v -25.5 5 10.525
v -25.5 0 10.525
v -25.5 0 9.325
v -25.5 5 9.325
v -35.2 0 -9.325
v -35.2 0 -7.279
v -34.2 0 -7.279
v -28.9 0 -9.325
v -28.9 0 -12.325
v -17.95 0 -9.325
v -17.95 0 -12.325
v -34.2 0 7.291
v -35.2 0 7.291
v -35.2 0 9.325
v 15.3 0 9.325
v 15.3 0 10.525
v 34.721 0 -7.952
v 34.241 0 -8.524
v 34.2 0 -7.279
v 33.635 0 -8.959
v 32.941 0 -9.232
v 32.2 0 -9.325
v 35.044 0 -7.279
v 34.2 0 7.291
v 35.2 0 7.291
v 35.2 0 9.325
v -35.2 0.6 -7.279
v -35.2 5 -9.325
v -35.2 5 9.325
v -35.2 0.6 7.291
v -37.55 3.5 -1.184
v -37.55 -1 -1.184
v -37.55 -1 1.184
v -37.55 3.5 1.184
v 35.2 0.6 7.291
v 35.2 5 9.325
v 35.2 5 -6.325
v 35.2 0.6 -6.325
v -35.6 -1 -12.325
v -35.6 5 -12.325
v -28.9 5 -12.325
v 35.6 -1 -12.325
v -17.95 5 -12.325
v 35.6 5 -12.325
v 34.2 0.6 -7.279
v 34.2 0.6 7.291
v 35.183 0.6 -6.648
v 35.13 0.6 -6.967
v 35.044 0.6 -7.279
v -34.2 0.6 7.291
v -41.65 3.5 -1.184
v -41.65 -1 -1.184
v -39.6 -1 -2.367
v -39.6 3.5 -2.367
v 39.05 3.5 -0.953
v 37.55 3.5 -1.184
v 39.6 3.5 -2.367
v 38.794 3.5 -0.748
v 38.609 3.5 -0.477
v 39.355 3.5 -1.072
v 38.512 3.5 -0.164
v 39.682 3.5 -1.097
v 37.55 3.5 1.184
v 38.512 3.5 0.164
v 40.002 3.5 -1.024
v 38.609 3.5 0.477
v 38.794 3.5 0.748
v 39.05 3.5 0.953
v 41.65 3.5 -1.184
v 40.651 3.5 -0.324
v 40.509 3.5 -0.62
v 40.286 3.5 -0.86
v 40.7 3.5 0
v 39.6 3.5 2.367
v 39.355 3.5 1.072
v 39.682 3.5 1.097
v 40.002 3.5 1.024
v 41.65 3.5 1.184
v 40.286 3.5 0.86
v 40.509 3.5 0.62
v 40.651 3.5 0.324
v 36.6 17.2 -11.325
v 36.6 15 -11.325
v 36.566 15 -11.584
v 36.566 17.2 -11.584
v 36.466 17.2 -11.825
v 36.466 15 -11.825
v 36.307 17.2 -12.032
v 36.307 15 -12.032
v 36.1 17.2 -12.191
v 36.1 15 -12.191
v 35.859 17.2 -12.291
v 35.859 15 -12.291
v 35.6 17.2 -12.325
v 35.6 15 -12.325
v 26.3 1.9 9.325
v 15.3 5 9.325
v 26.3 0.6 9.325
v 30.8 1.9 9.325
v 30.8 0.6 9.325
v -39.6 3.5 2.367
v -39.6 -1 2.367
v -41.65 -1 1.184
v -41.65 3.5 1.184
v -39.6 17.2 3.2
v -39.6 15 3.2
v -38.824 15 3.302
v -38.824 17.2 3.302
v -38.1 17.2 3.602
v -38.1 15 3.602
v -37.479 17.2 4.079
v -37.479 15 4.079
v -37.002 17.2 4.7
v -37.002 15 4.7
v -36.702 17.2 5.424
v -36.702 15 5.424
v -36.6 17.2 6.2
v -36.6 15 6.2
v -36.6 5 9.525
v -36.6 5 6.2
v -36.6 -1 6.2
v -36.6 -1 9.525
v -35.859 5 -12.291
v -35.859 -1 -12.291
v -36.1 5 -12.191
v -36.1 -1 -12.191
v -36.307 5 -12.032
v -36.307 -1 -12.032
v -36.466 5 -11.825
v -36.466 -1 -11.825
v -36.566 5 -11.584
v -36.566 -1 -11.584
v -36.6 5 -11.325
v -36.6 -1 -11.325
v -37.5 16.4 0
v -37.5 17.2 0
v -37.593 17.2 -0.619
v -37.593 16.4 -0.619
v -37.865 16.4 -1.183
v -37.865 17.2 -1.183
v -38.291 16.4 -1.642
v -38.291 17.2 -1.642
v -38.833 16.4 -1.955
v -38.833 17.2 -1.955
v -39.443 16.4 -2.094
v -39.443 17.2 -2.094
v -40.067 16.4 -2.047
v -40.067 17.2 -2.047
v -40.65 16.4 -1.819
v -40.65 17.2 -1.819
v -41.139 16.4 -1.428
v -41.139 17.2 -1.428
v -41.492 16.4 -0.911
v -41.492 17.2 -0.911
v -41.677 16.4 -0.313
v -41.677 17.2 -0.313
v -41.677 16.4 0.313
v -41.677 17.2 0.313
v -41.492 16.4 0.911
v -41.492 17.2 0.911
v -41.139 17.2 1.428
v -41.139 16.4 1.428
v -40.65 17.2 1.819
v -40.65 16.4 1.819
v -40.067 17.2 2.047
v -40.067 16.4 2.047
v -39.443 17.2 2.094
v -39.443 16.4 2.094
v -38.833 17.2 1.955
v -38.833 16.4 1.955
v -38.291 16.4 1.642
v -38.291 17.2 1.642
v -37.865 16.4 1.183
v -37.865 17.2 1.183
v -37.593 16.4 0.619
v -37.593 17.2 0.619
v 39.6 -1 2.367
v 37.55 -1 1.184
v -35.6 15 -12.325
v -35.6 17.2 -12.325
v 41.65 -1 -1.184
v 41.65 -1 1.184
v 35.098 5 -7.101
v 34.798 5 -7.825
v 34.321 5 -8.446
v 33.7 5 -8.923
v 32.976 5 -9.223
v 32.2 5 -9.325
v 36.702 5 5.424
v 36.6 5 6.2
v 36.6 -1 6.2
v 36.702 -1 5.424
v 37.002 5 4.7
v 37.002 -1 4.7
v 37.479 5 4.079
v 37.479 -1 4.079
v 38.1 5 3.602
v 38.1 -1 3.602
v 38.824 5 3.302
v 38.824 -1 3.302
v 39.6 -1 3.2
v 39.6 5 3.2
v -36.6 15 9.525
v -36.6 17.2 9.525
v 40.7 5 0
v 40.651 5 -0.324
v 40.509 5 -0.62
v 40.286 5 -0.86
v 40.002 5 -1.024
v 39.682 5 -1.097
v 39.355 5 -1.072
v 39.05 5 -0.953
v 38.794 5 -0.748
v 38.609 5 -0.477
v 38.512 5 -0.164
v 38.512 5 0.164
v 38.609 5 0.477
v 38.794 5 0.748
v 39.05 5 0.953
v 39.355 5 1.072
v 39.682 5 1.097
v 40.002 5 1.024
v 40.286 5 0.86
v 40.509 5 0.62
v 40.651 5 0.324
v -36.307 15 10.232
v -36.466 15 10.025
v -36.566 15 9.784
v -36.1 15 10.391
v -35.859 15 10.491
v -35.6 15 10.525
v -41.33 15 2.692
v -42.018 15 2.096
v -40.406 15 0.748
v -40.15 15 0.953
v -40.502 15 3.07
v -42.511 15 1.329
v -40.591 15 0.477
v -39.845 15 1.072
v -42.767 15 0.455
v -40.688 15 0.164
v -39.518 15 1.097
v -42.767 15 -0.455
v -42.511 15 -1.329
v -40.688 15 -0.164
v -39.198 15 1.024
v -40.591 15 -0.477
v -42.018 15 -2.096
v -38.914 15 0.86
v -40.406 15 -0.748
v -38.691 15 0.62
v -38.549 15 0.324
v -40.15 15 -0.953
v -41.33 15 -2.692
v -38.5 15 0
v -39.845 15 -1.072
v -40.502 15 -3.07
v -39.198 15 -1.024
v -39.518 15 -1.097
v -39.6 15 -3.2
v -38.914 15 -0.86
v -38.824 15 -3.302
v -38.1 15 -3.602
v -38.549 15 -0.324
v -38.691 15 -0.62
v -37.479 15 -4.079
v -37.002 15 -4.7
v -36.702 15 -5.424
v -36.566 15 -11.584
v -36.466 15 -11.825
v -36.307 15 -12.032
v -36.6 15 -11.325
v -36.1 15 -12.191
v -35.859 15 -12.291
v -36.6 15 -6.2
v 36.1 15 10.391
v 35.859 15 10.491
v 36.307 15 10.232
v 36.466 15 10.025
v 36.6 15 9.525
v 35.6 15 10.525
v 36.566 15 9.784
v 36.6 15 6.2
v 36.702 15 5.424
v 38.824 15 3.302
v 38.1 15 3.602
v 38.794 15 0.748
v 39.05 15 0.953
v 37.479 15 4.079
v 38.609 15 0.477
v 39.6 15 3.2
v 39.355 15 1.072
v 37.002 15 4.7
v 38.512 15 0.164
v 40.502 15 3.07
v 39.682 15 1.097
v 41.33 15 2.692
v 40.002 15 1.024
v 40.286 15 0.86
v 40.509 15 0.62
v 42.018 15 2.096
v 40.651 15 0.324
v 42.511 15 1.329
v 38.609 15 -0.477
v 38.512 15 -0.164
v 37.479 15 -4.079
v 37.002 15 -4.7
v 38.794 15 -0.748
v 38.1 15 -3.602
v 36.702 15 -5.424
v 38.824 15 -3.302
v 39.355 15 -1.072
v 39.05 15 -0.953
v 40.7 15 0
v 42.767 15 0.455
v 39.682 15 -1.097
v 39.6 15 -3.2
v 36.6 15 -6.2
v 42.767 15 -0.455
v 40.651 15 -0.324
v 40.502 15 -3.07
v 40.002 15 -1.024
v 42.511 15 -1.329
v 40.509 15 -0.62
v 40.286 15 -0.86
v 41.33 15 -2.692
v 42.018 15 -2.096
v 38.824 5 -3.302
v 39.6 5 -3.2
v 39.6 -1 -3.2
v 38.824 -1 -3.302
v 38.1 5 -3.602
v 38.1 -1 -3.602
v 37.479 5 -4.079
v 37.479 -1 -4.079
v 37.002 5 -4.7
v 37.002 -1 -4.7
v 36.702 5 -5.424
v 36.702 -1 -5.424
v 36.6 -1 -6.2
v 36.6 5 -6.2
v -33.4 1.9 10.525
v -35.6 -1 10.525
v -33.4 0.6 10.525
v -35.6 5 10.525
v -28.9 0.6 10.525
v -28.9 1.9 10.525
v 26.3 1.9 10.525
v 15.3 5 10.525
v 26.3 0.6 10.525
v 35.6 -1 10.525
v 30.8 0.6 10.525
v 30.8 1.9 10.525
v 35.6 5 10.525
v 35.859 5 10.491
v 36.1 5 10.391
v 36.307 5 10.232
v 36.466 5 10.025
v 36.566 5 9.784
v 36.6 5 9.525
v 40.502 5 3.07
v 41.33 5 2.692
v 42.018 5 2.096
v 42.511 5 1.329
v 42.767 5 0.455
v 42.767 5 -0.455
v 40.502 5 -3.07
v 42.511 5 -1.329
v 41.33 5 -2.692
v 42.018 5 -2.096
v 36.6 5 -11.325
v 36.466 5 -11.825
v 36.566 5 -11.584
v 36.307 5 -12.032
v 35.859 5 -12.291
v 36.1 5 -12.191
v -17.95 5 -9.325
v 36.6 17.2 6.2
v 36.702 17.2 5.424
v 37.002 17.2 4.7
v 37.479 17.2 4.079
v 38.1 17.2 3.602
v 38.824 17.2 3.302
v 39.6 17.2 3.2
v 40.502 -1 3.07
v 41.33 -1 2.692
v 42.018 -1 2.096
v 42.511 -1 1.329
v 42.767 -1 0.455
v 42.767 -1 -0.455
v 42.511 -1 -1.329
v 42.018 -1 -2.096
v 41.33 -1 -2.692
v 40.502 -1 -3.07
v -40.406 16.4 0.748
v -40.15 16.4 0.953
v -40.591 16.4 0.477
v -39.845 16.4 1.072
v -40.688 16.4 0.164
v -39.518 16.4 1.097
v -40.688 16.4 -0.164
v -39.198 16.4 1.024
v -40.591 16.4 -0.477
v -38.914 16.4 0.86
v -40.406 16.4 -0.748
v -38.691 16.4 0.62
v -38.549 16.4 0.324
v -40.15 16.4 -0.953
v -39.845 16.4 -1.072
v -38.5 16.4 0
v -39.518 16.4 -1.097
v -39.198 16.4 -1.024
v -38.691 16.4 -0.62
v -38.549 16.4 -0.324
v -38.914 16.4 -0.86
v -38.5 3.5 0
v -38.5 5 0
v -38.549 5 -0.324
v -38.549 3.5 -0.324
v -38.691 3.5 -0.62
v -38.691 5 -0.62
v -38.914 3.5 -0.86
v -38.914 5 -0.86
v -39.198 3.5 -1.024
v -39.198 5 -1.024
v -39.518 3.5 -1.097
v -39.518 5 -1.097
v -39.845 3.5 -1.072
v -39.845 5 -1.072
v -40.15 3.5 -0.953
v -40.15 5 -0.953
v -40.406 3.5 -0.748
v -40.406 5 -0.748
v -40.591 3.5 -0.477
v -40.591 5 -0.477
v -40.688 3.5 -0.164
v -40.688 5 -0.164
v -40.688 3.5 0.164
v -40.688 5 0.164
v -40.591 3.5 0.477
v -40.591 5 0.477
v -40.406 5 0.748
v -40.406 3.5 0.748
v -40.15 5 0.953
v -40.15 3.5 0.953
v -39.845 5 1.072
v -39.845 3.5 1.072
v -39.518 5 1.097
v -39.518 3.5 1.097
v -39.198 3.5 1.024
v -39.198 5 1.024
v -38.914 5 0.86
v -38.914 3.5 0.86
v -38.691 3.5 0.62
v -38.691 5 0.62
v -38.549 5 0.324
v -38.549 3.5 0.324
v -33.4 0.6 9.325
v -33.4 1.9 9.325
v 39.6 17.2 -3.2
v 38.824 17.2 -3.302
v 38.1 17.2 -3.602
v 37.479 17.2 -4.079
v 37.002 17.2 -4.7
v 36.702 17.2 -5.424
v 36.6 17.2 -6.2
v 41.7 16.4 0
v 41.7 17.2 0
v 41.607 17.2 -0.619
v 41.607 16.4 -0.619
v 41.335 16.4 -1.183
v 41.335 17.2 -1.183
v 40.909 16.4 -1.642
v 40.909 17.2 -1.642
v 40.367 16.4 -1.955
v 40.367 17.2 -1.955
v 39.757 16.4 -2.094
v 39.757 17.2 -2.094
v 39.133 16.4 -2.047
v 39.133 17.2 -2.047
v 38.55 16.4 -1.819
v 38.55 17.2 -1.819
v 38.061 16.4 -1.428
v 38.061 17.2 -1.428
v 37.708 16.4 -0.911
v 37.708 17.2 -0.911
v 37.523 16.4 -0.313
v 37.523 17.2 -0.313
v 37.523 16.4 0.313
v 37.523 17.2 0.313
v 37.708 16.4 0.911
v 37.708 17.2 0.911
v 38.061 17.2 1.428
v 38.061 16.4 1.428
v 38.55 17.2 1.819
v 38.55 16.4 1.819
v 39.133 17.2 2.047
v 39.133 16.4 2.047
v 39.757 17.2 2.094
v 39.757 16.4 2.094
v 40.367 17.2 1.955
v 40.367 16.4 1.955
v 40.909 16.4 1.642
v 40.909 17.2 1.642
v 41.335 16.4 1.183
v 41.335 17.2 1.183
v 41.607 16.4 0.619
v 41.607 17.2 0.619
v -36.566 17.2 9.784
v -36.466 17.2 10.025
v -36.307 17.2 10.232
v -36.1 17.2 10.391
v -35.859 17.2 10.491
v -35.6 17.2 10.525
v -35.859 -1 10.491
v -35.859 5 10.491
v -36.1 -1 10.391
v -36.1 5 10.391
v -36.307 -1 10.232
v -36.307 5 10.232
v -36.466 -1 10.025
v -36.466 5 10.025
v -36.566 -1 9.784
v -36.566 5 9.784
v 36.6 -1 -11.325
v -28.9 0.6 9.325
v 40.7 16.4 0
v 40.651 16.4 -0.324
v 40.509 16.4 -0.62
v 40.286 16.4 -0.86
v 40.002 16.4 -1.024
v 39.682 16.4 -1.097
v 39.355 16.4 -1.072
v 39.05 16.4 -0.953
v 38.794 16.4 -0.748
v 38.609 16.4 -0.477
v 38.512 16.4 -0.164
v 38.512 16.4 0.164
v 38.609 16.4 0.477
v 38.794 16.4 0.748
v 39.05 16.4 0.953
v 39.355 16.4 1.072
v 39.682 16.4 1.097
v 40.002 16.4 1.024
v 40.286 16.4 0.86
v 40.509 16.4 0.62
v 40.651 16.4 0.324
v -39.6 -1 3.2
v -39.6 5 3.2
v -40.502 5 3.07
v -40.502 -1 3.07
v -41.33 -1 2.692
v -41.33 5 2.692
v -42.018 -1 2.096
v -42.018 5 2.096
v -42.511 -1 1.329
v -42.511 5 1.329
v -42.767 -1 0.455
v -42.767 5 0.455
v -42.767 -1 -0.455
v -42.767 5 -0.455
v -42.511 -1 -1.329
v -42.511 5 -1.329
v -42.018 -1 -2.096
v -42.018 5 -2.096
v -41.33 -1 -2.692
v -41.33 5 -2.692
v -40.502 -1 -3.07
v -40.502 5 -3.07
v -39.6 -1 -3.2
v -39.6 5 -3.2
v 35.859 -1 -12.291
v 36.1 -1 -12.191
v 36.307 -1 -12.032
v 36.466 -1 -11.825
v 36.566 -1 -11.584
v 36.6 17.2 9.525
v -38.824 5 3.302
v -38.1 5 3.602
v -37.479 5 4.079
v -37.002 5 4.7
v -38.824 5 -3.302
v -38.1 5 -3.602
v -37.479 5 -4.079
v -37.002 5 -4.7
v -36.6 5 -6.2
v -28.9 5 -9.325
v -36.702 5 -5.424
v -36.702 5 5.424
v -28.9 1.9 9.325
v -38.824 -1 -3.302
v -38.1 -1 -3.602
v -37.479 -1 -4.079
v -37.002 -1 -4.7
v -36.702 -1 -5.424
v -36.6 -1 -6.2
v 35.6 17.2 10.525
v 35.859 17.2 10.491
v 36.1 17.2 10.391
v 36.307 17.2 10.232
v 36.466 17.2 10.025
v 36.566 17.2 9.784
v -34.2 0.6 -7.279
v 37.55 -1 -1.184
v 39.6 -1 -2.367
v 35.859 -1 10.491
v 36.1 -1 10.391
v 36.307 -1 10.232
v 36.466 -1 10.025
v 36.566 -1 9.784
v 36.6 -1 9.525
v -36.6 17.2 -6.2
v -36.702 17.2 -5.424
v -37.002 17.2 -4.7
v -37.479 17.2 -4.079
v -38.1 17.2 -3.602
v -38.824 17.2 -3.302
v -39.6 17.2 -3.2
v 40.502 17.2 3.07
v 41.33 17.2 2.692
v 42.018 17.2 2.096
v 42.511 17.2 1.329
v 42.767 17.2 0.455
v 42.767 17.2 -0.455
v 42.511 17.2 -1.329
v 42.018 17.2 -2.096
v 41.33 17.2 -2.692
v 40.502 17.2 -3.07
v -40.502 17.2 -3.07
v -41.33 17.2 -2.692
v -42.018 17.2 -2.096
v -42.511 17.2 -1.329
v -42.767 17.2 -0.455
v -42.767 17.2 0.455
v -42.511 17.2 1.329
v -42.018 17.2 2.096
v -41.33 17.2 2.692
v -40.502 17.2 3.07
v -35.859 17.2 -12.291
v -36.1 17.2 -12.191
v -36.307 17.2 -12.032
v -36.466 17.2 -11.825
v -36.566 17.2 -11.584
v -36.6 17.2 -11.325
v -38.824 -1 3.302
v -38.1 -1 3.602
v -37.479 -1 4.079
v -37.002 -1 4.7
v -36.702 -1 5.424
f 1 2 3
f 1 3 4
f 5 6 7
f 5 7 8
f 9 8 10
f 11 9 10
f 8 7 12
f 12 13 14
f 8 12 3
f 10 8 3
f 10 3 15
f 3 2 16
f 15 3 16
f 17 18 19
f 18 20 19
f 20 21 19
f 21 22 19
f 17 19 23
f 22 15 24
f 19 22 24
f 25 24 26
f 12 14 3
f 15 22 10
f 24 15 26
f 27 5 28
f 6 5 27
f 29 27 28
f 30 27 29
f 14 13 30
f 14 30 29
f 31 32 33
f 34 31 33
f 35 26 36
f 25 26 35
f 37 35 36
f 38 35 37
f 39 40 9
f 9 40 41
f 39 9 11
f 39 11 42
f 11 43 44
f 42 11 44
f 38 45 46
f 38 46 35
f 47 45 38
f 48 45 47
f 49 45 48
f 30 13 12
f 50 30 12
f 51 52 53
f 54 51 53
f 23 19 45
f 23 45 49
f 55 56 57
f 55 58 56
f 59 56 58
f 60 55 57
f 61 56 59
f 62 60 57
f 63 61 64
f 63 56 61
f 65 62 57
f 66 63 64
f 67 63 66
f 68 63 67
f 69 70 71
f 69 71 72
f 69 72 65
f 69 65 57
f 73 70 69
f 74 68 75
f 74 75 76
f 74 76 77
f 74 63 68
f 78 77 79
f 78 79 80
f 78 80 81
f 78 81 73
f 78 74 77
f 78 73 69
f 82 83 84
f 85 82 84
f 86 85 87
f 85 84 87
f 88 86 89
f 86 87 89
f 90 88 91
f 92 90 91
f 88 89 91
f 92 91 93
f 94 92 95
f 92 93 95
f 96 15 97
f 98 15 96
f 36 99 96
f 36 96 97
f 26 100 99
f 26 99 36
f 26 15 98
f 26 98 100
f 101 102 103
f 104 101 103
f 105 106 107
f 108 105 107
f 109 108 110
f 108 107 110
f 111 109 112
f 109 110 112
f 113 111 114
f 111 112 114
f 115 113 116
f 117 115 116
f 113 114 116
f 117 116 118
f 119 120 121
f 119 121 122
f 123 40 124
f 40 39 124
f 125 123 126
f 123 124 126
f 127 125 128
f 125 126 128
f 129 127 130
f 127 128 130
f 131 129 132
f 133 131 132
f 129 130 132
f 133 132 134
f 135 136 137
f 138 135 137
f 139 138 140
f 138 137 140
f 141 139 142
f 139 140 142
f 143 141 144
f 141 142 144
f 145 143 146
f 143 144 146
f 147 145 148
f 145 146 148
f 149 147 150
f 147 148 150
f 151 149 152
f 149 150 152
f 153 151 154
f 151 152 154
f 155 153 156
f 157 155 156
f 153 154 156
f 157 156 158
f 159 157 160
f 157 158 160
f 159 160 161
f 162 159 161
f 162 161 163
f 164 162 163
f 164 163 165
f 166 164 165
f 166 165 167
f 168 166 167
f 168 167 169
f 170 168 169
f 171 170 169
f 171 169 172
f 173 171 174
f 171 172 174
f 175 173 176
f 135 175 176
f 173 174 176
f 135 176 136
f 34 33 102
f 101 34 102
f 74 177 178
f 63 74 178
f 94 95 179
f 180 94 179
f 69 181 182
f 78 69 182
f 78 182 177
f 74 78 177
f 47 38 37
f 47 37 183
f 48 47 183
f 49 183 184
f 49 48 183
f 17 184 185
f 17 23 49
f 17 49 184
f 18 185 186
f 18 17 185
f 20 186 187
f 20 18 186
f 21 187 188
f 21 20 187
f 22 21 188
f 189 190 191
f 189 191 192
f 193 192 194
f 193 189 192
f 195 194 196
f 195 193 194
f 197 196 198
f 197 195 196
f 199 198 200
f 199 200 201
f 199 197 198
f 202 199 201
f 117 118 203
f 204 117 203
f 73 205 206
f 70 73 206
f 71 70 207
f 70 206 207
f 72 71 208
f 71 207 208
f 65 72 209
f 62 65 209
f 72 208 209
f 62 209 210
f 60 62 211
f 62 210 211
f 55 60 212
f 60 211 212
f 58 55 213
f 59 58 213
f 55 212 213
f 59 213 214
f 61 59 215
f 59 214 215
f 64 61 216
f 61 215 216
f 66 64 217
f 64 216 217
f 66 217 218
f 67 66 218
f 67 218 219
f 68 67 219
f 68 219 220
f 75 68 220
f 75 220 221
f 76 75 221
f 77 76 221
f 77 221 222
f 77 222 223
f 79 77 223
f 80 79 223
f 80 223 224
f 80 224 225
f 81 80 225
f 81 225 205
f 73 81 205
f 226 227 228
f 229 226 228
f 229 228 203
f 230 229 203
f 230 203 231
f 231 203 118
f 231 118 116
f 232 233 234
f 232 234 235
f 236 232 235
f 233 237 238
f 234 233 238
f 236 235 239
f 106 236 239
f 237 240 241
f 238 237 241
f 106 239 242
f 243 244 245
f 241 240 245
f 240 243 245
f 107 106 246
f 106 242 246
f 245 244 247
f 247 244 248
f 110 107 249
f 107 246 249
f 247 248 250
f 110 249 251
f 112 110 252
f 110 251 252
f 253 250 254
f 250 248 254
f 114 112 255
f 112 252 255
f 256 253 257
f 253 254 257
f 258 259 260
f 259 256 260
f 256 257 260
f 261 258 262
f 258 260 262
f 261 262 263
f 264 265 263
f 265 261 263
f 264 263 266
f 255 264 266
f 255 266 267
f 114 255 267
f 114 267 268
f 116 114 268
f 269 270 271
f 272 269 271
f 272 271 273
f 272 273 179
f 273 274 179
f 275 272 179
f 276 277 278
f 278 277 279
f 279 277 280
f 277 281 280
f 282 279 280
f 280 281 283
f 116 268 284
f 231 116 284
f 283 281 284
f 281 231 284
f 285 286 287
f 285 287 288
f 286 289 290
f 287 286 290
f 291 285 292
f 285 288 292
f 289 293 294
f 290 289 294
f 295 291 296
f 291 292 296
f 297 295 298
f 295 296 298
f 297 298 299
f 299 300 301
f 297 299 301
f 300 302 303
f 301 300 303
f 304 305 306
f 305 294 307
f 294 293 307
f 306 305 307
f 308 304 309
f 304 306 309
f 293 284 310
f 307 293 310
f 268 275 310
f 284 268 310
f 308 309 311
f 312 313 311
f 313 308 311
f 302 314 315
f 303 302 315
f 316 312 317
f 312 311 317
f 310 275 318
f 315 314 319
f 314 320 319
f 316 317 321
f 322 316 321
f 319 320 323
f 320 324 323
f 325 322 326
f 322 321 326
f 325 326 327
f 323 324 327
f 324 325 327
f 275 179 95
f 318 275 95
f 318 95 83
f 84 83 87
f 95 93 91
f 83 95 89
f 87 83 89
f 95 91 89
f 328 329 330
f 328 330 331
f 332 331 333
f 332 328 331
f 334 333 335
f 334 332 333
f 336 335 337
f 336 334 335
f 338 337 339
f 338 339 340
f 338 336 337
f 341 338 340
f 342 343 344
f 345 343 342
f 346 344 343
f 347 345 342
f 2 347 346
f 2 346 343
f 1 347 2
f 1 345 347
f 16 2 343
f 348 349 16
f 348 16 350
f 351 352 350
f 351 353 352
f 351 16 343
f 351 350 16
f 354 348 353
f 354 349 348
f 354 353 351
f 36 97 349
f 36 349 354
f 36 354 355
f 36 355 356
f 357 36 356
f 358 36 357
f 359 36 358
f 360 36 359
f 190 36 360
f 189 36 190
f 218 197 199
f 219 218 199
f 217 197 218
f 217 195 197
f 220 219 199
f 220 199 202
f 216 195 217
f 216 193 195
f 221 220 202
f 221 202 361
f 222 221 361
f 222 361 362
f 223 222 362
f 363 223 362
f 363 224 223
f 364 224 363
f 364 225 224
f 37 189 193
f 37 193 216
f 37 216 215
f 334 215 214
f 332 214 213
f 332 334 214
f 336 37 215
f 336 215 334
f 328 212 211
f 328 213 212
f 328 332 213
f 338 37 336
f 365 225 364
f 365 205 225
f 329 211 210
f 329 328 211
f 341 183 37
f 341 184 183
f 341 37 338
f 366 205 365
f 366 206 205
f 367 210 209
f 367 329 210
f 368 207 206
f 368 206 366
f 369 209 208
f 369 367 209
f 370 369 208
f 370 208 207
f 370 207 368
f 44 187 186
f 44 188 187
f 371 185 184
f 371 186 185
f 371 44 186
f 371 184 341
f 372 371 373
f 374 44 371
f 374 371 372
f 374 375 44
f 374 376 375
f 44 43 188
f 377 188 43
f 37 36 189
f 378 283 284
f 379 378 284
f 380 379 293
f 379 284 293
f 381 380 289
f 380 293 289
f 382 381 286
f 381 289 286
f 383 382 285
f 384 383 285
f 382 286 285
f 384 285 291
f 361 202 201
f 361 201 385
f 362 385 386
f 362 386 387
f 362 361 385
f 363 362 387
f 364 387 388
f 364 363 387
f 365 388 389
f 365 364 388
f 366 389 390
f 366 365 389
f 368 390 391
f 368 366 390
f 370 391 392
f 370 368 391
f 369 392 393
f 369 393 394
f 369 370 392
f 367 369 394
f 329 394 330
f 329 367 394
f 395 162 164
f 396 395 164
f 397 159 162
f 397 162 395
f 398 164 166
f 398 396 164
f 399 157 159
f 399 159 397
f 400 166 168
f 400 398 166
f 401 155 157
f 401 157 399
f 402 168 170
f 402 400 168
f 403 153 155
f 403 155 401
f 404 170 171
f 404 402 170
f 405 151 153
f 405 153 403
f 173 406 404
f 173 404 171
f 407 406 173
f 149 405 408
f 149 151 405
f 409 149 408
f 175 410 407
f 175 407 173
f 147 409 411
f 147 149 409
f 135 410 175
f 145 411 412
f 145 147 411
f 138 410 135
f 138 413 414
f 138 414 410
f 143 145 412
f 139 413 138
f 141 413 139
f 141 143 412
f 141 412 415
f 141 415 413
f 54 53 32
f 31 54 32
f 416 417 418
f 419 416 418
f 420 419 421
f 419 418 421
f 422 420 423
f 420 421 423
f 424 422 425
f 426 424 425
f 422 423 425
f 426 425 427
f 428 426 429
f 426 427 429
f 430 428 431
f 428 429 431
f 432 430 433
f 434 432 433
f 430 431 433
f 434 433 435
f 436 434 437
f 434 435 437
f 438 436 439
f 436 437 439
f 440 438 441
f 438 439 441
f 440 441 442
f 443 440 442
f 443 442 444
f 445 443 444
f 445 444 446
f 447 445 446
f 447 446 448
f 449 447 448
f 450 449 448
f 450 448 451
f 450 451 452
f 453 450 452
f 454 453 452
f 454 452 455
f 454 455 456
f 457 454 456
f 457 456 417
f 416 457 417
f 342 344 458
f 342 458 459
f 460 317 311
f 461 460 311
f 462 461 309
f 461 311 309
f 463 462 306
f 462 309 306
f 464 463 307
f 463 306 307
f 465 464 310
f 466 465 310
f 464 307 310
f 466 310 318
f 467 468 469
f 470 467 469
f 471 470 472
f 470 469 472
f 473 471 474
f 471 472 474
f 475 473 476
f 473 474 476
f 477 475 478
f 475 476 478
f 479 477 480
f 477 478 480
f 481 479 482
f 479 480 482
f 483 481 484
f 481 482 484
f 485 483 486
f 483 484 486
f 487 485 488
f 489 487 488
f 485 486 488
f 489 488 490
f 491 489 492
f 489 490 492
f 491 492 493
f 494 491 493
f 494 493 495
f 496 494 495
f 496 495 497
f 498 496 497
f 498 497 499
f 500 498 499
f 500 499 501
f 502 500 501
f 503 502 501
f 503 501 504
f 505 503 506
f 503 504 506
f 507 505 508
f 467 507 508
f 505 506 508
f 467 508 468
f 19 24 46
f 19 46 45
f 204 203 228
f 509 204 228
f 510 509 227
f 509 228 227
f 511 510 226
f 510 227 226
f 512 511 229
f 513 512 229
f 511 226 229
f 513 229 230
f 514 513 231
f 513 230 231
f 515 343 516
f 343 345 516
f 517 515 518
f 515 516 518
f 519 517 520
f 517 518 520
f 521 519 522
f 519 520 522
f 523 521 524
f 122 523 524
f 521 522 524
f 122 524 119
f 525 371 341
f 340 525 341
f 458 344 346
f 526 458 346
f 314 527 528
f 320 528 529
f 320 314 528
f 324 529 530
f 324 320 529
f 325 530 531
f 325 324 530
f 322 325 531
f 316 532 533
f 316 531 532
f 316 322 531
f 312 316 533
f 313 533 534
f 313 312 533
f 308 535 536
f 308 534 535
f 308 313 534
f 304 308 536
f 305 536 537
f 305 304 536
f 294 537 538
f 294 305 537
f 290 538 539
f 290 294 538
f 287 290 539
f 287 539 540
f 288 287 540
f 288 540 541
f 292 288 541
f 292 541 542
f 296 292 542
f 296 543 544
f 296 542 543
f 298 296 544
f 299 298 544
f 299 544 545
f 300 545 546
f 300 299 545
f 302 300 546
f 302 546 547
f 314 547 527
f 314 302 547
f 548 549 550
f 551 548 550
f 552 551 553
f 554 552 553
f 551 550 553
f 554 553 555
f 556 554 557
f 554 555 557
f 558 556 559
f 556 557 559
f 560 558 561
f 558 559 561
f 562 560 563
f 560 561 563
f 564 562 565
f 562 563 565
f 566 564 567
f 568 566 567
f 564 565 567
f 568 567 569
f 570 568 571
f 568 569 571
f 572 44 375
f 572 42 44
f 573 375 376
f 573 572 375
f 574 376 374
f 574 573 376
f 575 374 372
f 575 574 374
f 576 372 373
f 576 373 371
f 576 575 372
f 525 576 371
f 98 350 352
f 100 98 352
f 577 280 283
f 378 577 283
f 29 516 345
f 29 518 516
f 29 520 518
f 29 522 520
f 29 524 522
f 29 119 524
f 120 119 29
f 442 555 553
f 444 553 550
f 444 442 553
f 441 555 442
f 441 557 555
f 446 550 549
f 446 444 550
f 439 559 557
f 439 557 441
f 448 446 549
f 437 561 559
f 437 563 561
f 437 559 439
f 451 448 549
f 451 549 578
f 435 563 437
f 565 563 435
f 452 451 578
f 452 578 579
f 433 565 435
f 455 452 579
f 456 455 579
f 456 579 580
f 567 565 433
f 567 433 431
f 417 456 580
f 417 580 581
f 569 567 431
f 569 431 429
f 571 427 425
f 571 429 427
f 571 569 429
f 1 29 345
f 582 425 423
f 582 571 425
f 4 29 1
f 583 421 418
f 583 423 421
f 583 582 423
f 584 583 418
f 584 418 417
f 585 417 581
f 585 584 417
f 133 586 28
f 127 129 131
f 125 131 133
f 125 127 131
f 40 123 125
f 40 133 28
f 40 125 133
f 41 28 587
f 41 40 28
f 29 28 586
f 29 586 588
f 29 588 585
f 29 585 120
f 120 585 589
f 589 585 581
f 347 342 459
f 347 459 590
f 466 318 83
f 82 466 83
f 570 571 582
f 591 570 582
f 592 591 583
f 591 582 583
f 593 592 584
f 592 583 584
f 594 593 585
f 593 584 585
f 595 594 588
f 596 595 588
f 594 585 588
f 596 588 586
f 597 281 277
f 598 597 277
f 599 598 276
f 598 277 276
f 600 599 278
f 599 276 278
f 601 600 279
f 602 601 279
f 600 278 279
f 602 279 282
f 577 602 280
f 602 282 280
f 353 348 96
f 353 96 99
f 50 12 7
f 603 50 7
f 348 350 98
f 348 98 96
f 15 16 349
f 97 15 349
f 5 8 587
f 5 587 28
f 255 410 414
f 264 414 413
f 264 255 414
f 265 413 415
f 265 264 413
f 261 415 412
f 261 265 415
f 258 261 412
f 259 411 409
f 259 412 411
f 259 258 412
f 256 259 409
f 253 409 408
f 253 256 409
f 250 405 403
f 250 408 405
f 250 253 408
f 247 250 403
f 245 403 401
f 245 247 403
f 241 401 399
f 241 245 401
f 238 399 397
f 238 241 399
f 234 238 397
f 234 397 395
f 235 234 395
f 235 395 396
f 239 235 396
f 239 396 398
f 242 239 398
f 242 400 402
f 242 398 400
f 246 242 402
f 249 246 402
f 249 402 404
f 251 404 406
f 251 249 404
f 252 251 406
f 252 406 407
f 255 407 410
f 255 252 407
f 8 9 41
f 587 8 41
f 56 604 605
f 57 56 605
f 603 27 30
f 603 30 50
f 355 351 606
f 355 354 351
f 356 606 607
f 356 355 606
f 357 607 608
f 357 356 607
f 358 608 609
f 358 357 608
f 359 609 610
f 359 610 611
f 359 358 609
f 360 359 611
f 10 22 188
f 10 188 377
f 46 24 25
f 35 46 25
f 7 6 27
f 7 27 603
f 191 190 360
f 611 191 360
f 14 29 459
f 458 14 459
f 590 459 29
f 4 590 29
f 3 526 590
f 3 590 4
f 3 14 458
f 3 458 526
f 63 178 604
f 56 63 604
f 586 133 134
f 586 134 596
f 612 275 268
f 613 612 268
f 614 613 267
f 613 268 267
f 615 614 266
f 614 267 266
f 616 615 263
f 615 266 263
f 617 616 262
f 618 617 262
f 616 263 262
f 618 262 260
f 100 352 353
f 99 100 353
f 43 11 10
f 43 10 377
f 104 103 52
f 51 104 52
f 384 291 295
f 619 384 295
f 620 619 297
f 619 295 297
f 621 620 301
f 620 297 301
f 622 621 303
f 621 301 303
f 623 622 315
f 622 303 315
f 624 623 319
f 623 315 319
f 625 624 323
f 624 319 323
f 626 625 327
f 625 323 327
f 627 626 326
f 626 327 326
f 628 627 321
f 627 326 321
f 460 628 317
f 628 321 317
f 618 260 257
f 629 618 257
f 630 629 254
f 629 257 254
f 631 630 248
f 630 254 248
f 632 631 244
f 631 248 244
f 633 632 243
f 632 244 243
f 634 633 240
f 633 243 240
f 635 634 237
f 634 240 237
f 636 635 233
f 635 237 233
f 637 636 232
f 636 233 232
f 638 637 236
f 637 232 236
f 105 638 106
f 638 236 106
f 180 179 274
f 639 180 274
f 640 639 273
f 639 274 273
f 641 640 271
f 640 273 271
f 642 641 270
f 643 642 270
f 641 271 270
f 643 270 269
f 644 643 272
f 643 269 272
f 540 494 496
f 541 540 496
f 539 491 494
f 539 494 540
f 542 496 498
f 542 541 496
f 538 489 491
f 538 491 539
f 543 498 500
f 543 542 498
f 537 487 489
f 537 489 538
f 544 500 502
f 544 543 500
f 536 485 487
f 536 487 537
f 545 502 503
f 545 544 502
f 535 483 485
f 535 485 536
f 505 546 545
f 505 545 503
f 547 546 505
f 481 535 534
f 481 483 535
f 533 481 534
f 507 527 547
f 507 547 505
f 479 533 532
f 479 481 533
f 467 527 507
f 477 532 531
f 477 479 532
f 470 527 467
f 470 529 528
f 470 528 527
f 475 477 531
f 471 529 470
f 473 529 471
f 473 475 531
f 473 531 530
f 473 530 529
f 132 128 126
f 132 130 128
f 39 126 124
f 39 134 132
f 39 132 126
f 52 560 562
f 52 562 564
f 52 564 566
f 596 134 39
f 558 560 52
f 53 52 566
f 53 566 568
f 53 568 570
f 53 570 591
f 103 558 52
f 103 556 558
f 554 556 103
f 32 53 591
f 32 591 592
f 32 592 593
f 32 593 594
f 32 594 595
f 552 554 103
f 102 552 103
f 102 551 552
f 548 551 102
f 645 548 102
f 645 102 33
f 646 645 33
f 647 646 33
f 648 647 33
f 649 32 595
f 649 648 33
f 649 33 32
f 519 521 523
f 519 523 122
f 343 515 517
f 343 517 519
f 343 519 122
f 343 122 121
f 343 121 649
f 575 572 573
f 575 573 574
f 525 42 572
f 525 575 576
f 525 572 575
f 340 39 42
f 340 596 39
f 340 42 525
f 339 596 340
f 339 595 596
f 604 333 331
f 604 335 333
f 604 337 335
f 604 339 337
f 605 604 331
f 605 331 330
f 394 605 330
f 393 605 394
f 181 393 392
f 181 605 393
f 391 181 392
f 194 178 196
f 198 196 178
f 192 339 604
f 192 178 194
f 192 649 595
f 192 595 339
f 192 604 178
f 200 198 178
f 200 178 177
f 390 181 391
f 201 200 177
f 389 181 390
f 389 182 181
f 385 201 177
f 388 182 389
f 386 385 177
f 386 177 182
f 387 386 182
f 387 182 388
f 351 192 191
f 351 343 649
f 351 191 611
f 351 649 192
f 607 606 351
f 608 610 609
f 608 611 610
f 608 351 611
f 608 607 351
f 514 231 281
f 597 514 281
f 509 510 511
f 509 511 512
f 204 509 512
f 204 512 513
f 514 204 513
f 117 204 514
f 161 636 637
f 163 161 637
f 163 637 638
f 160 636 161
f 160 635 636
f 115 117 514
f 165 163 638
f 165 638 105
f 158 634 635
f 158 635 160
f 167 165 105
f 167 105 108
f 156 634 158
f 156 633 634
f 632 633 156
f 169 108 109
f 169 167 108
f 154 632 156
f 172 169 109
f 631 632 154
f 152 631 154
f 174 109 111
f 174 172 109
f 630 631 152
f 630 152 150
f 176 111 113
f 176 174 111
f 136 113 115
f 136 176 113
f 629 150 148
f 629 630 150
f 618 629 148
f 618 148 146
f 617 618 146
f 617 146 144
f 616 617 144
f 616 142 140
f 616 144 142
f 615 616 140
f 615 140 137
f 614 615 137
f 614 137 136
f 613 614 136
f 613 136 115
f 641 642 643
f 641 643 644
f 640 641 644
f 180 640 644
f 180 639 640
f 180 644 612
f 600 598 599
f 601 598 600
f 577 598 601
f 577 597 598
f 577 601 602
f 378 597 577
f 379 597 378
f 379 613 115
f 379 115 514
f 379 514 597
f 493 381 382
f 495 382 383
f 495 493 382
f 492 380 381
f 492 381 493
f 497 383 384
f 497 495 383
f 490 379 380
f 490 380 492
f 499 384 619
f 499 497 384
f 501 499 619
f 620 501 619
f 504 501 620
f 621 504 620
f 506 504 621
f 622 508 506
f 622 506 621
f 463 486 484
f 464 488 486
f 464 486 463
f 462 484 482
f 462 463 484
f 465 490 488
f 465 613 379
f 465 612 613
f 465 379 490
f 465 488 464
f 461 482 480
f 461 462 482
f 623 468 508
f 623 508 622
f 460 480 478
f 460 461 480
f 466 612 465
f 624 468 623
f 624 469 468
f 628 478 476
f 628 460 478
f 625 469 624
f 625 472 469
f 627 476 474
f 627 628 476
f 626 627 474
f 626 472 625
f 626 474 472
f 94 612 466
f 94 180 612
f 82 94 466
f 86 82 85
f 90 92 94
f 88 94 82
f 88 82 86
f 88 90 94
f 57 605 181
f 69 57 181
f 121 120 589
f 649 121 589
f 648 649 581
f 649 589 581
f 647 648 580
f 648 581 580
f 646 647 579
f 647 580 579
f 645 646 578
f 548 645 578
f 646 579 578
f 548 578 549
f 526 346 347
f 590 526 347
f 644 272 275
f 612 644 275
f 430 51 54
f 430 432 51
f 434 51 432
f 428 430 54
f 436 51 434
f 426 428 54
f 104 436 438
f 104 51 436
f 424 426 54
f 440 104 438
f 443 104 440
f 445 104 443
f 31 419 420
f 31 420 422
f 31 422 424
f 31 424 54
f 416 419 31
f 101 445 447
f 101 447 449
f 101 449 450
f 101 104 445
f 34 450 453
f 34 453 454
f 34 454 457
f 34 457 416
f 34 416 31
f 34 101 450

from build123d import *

# Parameters (mm, degrees)
SKETCH_1_W          = 73.2
SKETCH_1_H          = 22.85
EXTRUDE_1_DEPTH     = 5
SKETCH_2_W          = 73.2
SKETCH_2_H          = 22.85
EXTRUDE_2_DEPTH     = 1
SKETCH_3_W          = 1
SKETCH_3_H          = 14.570353531
EXTRUDE_3_DEPTH     = 0.6
CUT_EXTRUDE_1_REACH = 24.85
SKETCH_4_W          = 10.95
SKETCH_4_H          = 5
CUT_EXTRUDE_2_REACH = 24.85
SKETCH_5_W          = 40.8
SKETCH_5_H          = 5
SKETCH_5_W_2        = 4.5
SKETCH_5_H_2        = 1.3
FILLET_1_R          = 1
SKETCH_6_R          = 1.1
EXTRUDE_4_DEPTH     = 6
CUT_EXTRUDE_3_DEPTH = 4.5
SKETCH_8_R          = 1.1
EXTRUDE_5_DEPTH     = 2.2
SKETCH_9_R          = 2.1
CUT_EXTRUDE_4_DEPTH = 0.8


with BuildPart() as part:
    # 草图1 → 凸台-拉伸1 (new body)
    with BuildSketch(Plane(origin=(0, 0, 0), x_dir=(1, 0, 0), z_dir=(0, 1, 0))):
        with Locations((0, 0.9)):
            Rectangle(SKETCH_1_W, SKETCH_1_H)
        with BuildLine():
            Line((-35.2, -9.325), (35.2, -9.325))
            Line((35.2, -9.325), (35.2, 6.325))
            ThreePointArc((35.2, 6.325), (34.321320344, 8.446320344), (32.2, 9.325))
            Line((32.2, 9.325), (-35.2, 9.325))
            Line((-35.2, 9.325), (-35.2, -9.325))
        make_face(mode=Mode.SUBTRACT)
    extrude(amount=EXTRUDE_1_DEPTH)

    # 草图2 → 凸台-拉伸2 (add)
    with BuildSketch(Plane.XZ):
        with Locations((0, -0.9)):
            Rectangle(SKETCH_2_W, SKETCH_2_H)
    extrude(amount=EXTRUDE_2_DEPTH)

    # 草图3 → 凸台-拉伸3 (add)
    with BuildSketch(Plane(origin=(0, 0, 0), x_dir=(1, 0, 0), z_dir=(0, 1, 0))):
        with Locations((-34.7, -0.005928717)):
            Rectangle(SKETCH_3_W, SKETCH_3_H)
        with Locations((34.7, -0.005928717)):
            Rectangle(SKETCH_3_W, SKETCH_3_H)
    extrude(amount=EXTRUDE_3_DEPTH)

    # 草图4 → 切除-拉伸1 (cut, up to next)
    with BuildSketch(Plane(origin=(0, 0, -12.325), x_dir=(-1, 0, 0), z_dir=(0, 0, -1)), mode=Mode.PRIVATE) as cut_extrude_1_sk1:
        with Locations((23.425, 2.5)):
            Rectangle(SKETCH_4_W, SKETCH_4_H)
    cut_extrude_1_tool1 = extrude(cut_extrude_1_sk1.sketch, amount=-CUT_EXTRUDE_1_REACH, mode=Mode.PRIVATE) & part.part
    add(cut_extrude_1_tool1.solids().sort_by_distance((-23.425, 2.5, -12.325))[0], mode=Mode.SUBTRACT)

    # 草图5 → 切除-拉伸2 (cut, up to next)
    with BuildSketch(Plane.XY.offset(10.525), mode=Mode.PRIVATE) as cut_extrude_2_sk1:
        with Locations((-5.1, 2.5)):
            Rectangle(SKETCH_5_W, SKETCH_5_H)
    cut_extrude_2_tool1 = extrude(cut_extrude_2_sk1.sketch, amount=-CUT_EXTRUDE_2_REACH, mode=Mode.PRIVATE) & part.part
    add(cut_extrude_2_tool1.solids().sort_by_distance((-5.1, 2.5, 10.525))[0], mode=Mode.SUBTRACT)
    # 草图5 → 切除-拉伸2 (cut, up to next)
    with BuildSketch(Plane.XY.offset(10.525), mode=Mode.PRIVATE) as cut_extrude_2_sk2:
        with Locations((-31.15, 1.25)):
            Rectangle(SKETCH_5_W_2, SKETCH_5_H_2)
    cut_extrude_2_tool2 = extrude(cut_extrude_2_sk2.sketch, amount=-CUT_EXTRUDE_2_REACH, mode=Mode.PRIVATE) & part.part
    add(cut_extrude_2_tool2.solids().sort_by_distance((-31.15, 1.25, 10.525))[0], mode=Mode.SUBTRACT)
    # 草图5 → 切除-拉伸2 (cut, up to next)
    with BuildSketch(Plane.XY.offset(10.525), mode=Mode.PRIVATE) as cut_extrude_2_sk3:
        with Locations((28.55, 1.25)):
            Rectangle(SKETCH_5_W_2, SKETCH_5_H_2)
    cut_extrude_2_tool3 = extrude(cut_extrude_2_sk3.sketch, amount=-CUT_EXTRUDE_2_REACH, mode=Mode.PRIVATE) & part.part
    add(cut_extrude_2_tool3.solids().sort_by_distance((28.55, 1.25, 10.525))[0], mode=Mode.SUBTRACT)

    # 圆角1
    fillet_1_edges = [part.edges().sort_by_distance(p)[0] for p in [
        (-36.6, 2, -12.325),
        (36.6, 2, -12.325),
        (36.6, 2, 10.525),
        (-36.6, 2, 10.525),
    ]]
    fillet(fillet_1_edges, radius=FILLET_1_R)

    # 草图6 → 凸台-拉伸4 (add)
    with BuildSketch(Plane(origin=(0, 5, 0), x_dir=(1, 0, 0), z_dir=(0, 1, 0))):
        with BuildLine():
            Line((-36.6, 6.2), (-36.6, -6.2))
            ThreePointArc((-36.6, -6.2), (-37.478679656, -4.078679656), (-39.6, -3.2))
            ThreePointArc((-39.6, -3.2), (-42.8, 0), (-39.6, 3.2))
            ThreePointArc((-39.6, 3.2), (-37.478679656, 4.078679656), (-36.6, 6.2))
        make_face()
        with Locations((-39.6, 0)):
            Circle(SKETCH_6_R, mode=Mode.SUBTRACT)
        with BuildLine():
            Line((36.6, 6.2), (36.6, -6.2))
            ThreePointArc((36.6, -6.2), (37.478679656, -4.078679656), (39.6, -3.2))
            ThreePointArc((39.6, -3.2), (42.8, 0), (39.6, 3.2))
            ThreePointArc((39.6, 3.2), (37.478679656, 4.078679656), (36.6, 6.2))
        make_face()
        with Locations((39.6, 0)):
            Circle(SKETCH_6_R, mode=Mode.SUBTRACT)
    extrude(amount=-EXTRUDE_4_DEPTH)

    # 草图7 → 切除-拉伸3 (cut)
    with BuildSketch(Plane.XZ.offset(1)):
        Polygon((-37.55, 1.183568052), (-39.6, 2.367136104), (-41.65, 1.183568052), (-41.65, -1.183568052), (-39.6, -2.367136104), (-37.55, -1.183568052), align=None)
        Polygon((39.6, 2.367136104), (37.55, 1.183568052), (37.55, -1.183568052), (39.6, -2.367136104), (41.65, -1.183568052), (41.65, 1.183568052), align=None)
    extrude(amount=-CUT_EXTRUDE_3_DEPTH, mode=Mode.SUBTRACT)


with BuildPart() as body_2:
    # 草图8 → 凸台-拉伸5 (new body)
    with BuildSketch(Plane(origin=(0, 15, 0), x_dir=(1, 0, 0), z_dir=(0, 1, 0))):
        with BuildLine():
            Line((36.6, -9.525), (36.6, -6.2))
            ThreePointArc((36.6, -6.2), (37.478679656, -4.078679656), (39.6, -3.2))
            ThreePointArc((39.6, -3.2), (42.8, 0), (39.6, 3.2))
            ThreePointArc((39.6, 3.2), (37.478679656, 4.078679656), (36.6, 6.2))
            Line((36.6, 6.2), (36.6, 11.325))
            ThreePointArc((36.6, 11.325), (36.307106781, 12.032106781), (35.6, 12.325))
            Line((35.6, 12.325), (-35.6, 12.325))
            ThreePointArc((-35.6, 12.325), (-36.307106781, 12.032106781), (-36.6, 11.325))
            Line((-36.6, 11.325), (-36.6, 6.2))
            ThreePointArc((-36.6, 6.2), (-37.478679656, 4.078679656), (-39.6, 3.2))
            ThreePointArc((-39.6, 3.2), (-42.8, 0), (-39.6, -3.2))
            ThreePointArc((-39.6, -3.2), (-37.478679656, -4.078679656), (-36.6, -6.2))
            Line((-36.6, -6.2), (-36.6, -9.525))
            ThreePointArc((-36.6, -9.525), (-36.307106781, -10.232106781), (-35.6, -10.525))
            Line((-35.6, -10.525), (35.6, -10.525))
            ThreePointArc((35.6, -10.525), (36.307106781, -10.232106781), (36.6, -9.525))
        make_face()
        with Locations((39.6, 0)):
            Circle(SKETCH_8_R, mode=Mode.SUBTRACT)
        with Locations((-39.6, 0)):
            Circle(SKETCH_8_R, mode=Mode.SUBTRACT)
    extrude(amount=EXTRUDE_5_DEPTH)

    # 草图9 → 切除-拉伸4 (cut)
    with BuildSketch(Plane(origin=(0, 17.2, 0), x_dir=(1, 0, 0), z_dir=(0, 1, 0))):
        with Locations((-39.6, 0)):
            Circle(SKETCH_9_R)
        with Locations((39.6, 0)):
            Circle(SKETCH_9_R)
    extrude(amount=-CUT_EXTRUDE_4_DEPTH, mode=Mode.SUBTRACT)


solid = Compound([part.part, body_2.part])
